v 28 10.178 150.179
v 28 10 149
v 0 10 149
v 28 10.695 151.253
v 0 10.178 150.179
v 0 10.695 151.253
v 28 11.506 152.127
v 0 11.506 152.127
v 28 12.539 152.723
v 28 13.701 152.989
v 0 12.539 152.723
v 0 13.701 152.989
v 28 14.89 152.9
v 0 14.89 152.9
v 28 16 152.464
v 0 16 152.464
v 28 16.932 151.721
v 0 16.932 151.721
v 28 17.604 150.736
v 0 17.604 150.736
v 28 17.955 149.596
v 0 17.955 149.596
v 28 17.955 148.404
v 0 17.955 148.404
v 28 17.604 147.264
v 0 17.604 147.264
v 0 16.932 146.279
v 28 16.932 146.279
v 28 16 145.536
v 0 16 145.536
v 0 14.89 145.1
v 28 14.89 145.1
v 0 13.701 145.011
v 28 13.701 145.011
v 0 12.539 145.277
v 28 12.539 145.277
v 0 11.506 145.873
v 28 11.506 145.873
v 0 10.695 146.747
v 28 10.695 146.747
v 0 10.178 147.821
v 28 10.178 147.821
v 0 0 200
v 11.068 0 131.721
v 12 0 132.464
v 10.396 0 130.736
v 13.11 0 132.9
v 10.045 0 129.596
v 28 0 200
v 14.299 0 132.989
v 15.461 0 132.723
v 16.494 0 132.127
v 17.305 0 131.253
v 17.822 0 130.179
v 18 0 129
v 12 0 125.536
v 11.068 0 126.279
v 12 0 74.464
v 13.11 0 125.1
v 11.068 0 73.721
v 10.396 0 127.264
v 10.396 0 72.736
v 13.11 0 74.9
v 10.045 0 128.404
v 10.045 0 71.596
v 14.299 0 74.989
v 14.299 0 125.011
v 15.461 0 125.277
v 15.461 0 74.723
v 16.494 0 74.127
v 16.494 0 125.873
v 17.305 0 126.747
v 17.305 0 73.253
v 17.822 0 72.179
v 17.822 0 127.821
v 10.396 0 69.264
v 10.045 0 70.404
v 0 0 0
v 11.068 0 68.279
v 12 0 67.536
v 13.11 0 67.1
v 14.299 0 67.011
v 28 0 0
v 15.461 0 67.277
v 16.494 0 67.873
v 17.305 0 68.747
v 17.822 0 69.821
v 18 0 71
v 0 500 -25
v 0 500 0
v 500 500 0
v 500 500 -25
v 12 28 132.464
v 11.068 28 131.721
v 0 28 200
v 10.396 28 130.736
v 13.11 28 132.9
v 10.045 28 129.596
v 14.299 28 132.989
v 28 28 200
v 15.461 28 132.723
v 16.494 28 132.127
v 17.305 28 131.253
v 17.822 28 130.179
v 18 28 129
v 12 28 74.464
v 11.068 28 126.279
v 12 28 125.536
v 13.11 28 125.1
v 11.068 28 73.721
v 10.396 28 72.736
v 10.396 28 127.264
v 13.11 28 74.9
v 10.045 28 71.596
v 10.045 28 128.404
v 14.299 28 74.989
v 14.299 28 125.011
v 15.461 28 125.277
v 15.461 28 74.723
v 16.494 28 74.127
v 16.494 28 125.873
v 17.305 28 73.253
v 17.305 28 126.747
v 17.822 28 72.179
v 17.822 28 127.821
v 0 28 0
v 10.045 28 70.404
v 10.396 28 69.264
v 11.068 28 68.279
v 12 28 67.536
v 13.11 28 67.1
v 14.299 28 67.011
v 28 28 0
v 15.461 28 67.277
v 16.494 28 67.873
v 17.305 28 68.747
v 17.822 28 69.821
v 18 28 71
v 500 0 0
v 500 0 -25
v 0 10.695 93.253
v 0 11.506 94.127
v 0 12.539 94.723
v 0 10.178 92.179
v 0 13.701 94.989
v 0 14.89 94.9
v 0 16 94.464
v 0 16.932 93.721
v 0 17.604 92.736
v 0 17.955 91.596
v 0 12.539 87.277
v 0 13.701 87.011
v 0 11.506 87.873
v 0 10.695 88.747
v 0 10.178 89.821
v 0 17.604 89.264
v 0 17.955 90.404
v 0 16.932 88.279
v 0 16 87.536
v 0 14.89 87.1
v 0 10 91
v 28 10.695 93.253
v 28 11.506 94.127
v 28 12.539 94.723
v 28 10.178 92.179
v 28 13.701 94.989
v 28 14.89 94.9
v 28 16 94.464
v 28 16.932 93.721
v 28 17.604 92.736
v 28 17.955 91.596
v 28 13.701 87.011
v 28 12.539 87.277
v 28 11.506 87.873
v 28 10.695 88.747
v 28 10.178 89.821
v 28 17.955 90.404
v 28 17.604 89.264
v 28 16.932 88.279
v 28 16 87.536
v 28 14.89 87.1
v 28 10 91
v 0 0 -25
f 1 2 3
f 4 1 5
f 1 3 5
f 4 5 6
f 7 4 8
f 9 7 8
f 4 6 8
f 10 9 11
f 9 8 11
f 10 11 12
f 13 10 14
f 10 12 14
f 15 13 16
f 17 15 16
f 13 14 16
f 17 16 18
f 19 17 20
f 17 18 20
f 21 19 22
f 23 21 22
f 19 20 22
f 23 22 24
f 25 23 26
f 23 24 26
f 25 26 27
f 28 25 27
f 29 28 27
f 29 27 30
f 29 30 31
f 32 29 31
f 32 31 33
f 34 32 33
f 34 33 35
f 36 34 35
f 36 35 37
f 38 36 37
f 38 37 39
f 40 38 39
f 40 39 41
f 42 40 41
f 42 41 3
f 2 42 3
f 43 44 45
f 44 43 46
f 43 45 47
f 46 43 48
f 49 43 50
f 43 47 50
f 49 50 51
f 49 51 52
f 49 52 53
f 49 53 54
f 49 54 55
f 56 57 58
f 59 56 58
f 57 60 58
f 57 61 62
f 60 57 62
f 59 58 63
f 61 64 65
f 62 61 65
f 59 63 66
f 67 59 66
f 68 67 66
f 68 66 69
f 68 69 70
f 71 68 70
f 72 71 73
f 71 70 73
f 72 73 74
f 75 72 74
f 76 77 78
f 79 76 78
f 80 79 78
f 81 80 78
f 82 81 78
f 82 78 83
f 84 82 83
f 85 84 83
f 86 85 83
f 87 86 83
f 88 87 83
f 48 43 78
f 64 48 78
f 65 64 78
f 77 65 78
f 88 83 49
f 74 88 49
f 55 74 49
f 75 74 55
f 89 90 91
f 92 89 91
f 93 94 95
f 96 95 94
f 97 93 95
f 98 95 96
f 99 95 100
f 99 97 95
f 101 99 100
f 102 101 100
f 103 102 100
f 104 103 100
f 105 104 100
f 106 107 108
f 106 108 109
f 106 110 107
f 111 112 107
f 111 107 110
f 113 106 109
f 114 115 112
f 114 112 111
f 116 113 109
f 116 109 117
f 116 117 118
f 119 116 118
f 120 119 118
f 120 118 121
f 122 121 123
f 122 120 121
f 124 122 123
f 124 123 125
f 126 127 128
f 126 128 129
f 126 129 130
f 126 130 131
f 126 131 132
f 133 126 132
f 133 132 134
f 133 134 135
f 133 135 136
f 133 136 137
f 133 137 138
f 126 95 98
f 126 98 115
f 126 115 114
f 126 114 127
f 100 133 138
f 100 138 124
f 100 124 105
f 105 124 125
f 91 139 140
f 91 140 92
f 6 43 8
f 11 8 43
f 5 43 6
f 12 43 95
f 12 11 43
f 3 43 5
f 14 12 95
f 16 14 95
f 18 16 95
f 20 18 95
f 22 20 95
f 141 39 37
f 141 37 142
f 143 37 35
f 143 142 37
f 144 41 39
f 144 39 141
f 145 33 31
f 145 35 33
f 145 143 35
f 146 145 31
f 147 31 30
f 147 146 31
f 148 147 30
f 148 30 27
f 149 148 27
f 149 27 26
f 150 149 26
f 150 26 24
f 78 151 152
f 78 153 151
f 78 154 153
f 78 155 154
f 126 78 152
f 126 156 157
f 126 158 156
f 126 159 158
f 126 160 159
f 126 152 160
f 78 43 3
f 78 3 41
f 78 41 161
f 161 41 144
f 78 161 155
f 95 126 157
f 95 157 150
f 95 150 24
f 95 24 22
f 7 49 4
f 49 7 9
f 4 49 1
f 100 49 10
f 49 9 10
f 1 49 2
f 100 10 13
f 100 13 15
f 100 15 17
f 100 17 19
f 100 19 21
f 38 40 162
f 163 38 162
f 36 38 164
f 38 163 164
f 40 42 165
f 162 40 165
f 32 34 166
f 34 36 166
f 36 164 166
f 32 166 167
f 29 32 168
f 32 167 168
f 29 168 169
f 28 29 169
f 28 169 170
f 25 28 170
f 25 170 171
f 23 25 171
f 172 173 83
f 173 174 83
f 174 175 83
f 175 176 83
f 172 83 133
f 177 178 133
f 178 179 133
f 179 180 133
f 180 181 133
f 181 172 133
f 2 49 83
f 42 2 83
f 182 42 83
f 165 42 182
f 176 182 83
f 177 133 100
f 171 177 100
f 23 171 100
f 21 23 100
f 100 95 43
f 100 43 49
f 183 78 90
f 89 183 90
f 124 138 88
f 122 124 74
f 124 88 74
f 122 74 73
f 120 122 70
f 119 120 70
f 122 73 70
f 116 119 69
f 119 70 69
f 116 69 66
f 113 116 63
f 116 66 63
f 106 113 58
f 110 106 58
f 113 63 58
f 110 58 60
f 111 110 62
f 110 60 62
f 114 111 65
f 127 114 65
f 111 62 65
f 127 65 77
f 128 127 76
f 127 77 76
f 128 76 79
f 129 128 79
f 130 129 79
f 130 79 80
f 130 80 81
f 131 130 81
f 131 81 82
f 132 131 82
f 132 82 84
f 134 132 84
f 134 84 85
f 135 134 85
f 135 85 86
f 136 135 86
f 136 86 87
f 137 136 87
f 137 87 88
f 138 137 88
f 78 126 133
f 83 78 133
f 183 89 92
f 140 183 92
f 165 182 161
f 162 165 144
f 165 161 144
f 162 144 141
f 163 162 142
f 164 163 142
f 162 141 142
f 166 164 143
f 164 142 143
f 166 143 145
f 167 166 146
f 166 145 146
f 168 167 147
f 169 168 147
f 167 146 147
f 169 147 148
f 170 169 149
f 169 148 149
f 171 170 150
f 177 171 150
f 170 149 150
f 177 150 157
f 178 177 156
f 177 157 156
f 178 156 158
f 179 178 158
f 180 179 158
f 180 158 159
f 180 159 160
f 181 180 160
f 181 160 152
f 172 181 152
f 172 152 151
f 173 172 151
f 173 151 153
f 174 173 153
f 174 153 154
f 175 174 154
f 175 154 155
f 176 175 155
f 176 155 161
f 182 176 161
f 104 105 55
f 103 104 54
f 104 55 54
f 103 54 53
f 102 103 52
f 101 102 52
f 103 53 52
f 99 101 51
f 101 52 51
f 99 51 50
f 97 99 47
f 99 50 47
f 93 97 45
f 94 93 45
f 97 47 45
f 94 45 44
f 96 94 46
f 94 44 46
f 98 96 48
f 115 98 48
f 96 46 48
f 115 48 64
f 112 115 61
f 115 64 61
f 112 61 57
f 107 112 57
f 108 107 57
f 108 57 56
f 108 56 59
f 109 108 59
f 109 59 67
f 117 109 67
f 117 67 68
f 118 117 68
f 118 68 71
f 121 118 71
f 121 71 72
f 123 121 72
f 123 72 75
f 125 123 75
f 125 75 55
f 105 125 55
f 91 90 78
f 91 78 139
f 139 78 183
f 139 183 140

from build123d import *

# Parameters (mm, degrees)
F0_W     = 500
F0_H     = 500
F1_DEPTH = 25
F2_W     = 28
F2_H     = 28
F3_DEPTH = 200
F4_R     = 4
F5_DEPTH = 30
F6_R     = 4
F7_DEPTH = 30


with BuildPart() as f1:
    # F0 (on Top) → F1 (new body)
    with BuildSketch(Plane.XY):
        with Locations((250, 250)):
            Rectangle(F0_W, F0_H)
    extrude(amount=-F1_DEPTH)


with BuildPart() as f3:
    # F2 (on Top) → F3 (new body)
    with BuildSketch(Plane.XY):
        with Locations((14, 14)):
            Rectangle(F2_W, F2_H)
    extrude(amount=F3_DEPTH)

    # F4 (on face) → F5 (cut)
    with BuildSketch(Plane.XZ):
        with Locations((14, 129)):
            Circle(F4_R)
        with Locations((14, 71)):
            Circle(F4_R)
    extrude(amount=-F5_DEPTH, mode=Mode.SUBTRACT)

    # F6 (on face) → F7 (cut)
    with BuildSketch(Plane(origin=(0, 0, 0), x_dir=(0, -1, 0), z_dir=(-1, 0, 0))):
        with Locations((-14, 149)):
            Circle(F6_R)
        with Locations((-14, 91)):
            Circle(F6_R)
    extrude(amount=-F7_DEPTH, mode=Mode.SUBTRACT)


solid = Compound([f1.part, f3.part])
